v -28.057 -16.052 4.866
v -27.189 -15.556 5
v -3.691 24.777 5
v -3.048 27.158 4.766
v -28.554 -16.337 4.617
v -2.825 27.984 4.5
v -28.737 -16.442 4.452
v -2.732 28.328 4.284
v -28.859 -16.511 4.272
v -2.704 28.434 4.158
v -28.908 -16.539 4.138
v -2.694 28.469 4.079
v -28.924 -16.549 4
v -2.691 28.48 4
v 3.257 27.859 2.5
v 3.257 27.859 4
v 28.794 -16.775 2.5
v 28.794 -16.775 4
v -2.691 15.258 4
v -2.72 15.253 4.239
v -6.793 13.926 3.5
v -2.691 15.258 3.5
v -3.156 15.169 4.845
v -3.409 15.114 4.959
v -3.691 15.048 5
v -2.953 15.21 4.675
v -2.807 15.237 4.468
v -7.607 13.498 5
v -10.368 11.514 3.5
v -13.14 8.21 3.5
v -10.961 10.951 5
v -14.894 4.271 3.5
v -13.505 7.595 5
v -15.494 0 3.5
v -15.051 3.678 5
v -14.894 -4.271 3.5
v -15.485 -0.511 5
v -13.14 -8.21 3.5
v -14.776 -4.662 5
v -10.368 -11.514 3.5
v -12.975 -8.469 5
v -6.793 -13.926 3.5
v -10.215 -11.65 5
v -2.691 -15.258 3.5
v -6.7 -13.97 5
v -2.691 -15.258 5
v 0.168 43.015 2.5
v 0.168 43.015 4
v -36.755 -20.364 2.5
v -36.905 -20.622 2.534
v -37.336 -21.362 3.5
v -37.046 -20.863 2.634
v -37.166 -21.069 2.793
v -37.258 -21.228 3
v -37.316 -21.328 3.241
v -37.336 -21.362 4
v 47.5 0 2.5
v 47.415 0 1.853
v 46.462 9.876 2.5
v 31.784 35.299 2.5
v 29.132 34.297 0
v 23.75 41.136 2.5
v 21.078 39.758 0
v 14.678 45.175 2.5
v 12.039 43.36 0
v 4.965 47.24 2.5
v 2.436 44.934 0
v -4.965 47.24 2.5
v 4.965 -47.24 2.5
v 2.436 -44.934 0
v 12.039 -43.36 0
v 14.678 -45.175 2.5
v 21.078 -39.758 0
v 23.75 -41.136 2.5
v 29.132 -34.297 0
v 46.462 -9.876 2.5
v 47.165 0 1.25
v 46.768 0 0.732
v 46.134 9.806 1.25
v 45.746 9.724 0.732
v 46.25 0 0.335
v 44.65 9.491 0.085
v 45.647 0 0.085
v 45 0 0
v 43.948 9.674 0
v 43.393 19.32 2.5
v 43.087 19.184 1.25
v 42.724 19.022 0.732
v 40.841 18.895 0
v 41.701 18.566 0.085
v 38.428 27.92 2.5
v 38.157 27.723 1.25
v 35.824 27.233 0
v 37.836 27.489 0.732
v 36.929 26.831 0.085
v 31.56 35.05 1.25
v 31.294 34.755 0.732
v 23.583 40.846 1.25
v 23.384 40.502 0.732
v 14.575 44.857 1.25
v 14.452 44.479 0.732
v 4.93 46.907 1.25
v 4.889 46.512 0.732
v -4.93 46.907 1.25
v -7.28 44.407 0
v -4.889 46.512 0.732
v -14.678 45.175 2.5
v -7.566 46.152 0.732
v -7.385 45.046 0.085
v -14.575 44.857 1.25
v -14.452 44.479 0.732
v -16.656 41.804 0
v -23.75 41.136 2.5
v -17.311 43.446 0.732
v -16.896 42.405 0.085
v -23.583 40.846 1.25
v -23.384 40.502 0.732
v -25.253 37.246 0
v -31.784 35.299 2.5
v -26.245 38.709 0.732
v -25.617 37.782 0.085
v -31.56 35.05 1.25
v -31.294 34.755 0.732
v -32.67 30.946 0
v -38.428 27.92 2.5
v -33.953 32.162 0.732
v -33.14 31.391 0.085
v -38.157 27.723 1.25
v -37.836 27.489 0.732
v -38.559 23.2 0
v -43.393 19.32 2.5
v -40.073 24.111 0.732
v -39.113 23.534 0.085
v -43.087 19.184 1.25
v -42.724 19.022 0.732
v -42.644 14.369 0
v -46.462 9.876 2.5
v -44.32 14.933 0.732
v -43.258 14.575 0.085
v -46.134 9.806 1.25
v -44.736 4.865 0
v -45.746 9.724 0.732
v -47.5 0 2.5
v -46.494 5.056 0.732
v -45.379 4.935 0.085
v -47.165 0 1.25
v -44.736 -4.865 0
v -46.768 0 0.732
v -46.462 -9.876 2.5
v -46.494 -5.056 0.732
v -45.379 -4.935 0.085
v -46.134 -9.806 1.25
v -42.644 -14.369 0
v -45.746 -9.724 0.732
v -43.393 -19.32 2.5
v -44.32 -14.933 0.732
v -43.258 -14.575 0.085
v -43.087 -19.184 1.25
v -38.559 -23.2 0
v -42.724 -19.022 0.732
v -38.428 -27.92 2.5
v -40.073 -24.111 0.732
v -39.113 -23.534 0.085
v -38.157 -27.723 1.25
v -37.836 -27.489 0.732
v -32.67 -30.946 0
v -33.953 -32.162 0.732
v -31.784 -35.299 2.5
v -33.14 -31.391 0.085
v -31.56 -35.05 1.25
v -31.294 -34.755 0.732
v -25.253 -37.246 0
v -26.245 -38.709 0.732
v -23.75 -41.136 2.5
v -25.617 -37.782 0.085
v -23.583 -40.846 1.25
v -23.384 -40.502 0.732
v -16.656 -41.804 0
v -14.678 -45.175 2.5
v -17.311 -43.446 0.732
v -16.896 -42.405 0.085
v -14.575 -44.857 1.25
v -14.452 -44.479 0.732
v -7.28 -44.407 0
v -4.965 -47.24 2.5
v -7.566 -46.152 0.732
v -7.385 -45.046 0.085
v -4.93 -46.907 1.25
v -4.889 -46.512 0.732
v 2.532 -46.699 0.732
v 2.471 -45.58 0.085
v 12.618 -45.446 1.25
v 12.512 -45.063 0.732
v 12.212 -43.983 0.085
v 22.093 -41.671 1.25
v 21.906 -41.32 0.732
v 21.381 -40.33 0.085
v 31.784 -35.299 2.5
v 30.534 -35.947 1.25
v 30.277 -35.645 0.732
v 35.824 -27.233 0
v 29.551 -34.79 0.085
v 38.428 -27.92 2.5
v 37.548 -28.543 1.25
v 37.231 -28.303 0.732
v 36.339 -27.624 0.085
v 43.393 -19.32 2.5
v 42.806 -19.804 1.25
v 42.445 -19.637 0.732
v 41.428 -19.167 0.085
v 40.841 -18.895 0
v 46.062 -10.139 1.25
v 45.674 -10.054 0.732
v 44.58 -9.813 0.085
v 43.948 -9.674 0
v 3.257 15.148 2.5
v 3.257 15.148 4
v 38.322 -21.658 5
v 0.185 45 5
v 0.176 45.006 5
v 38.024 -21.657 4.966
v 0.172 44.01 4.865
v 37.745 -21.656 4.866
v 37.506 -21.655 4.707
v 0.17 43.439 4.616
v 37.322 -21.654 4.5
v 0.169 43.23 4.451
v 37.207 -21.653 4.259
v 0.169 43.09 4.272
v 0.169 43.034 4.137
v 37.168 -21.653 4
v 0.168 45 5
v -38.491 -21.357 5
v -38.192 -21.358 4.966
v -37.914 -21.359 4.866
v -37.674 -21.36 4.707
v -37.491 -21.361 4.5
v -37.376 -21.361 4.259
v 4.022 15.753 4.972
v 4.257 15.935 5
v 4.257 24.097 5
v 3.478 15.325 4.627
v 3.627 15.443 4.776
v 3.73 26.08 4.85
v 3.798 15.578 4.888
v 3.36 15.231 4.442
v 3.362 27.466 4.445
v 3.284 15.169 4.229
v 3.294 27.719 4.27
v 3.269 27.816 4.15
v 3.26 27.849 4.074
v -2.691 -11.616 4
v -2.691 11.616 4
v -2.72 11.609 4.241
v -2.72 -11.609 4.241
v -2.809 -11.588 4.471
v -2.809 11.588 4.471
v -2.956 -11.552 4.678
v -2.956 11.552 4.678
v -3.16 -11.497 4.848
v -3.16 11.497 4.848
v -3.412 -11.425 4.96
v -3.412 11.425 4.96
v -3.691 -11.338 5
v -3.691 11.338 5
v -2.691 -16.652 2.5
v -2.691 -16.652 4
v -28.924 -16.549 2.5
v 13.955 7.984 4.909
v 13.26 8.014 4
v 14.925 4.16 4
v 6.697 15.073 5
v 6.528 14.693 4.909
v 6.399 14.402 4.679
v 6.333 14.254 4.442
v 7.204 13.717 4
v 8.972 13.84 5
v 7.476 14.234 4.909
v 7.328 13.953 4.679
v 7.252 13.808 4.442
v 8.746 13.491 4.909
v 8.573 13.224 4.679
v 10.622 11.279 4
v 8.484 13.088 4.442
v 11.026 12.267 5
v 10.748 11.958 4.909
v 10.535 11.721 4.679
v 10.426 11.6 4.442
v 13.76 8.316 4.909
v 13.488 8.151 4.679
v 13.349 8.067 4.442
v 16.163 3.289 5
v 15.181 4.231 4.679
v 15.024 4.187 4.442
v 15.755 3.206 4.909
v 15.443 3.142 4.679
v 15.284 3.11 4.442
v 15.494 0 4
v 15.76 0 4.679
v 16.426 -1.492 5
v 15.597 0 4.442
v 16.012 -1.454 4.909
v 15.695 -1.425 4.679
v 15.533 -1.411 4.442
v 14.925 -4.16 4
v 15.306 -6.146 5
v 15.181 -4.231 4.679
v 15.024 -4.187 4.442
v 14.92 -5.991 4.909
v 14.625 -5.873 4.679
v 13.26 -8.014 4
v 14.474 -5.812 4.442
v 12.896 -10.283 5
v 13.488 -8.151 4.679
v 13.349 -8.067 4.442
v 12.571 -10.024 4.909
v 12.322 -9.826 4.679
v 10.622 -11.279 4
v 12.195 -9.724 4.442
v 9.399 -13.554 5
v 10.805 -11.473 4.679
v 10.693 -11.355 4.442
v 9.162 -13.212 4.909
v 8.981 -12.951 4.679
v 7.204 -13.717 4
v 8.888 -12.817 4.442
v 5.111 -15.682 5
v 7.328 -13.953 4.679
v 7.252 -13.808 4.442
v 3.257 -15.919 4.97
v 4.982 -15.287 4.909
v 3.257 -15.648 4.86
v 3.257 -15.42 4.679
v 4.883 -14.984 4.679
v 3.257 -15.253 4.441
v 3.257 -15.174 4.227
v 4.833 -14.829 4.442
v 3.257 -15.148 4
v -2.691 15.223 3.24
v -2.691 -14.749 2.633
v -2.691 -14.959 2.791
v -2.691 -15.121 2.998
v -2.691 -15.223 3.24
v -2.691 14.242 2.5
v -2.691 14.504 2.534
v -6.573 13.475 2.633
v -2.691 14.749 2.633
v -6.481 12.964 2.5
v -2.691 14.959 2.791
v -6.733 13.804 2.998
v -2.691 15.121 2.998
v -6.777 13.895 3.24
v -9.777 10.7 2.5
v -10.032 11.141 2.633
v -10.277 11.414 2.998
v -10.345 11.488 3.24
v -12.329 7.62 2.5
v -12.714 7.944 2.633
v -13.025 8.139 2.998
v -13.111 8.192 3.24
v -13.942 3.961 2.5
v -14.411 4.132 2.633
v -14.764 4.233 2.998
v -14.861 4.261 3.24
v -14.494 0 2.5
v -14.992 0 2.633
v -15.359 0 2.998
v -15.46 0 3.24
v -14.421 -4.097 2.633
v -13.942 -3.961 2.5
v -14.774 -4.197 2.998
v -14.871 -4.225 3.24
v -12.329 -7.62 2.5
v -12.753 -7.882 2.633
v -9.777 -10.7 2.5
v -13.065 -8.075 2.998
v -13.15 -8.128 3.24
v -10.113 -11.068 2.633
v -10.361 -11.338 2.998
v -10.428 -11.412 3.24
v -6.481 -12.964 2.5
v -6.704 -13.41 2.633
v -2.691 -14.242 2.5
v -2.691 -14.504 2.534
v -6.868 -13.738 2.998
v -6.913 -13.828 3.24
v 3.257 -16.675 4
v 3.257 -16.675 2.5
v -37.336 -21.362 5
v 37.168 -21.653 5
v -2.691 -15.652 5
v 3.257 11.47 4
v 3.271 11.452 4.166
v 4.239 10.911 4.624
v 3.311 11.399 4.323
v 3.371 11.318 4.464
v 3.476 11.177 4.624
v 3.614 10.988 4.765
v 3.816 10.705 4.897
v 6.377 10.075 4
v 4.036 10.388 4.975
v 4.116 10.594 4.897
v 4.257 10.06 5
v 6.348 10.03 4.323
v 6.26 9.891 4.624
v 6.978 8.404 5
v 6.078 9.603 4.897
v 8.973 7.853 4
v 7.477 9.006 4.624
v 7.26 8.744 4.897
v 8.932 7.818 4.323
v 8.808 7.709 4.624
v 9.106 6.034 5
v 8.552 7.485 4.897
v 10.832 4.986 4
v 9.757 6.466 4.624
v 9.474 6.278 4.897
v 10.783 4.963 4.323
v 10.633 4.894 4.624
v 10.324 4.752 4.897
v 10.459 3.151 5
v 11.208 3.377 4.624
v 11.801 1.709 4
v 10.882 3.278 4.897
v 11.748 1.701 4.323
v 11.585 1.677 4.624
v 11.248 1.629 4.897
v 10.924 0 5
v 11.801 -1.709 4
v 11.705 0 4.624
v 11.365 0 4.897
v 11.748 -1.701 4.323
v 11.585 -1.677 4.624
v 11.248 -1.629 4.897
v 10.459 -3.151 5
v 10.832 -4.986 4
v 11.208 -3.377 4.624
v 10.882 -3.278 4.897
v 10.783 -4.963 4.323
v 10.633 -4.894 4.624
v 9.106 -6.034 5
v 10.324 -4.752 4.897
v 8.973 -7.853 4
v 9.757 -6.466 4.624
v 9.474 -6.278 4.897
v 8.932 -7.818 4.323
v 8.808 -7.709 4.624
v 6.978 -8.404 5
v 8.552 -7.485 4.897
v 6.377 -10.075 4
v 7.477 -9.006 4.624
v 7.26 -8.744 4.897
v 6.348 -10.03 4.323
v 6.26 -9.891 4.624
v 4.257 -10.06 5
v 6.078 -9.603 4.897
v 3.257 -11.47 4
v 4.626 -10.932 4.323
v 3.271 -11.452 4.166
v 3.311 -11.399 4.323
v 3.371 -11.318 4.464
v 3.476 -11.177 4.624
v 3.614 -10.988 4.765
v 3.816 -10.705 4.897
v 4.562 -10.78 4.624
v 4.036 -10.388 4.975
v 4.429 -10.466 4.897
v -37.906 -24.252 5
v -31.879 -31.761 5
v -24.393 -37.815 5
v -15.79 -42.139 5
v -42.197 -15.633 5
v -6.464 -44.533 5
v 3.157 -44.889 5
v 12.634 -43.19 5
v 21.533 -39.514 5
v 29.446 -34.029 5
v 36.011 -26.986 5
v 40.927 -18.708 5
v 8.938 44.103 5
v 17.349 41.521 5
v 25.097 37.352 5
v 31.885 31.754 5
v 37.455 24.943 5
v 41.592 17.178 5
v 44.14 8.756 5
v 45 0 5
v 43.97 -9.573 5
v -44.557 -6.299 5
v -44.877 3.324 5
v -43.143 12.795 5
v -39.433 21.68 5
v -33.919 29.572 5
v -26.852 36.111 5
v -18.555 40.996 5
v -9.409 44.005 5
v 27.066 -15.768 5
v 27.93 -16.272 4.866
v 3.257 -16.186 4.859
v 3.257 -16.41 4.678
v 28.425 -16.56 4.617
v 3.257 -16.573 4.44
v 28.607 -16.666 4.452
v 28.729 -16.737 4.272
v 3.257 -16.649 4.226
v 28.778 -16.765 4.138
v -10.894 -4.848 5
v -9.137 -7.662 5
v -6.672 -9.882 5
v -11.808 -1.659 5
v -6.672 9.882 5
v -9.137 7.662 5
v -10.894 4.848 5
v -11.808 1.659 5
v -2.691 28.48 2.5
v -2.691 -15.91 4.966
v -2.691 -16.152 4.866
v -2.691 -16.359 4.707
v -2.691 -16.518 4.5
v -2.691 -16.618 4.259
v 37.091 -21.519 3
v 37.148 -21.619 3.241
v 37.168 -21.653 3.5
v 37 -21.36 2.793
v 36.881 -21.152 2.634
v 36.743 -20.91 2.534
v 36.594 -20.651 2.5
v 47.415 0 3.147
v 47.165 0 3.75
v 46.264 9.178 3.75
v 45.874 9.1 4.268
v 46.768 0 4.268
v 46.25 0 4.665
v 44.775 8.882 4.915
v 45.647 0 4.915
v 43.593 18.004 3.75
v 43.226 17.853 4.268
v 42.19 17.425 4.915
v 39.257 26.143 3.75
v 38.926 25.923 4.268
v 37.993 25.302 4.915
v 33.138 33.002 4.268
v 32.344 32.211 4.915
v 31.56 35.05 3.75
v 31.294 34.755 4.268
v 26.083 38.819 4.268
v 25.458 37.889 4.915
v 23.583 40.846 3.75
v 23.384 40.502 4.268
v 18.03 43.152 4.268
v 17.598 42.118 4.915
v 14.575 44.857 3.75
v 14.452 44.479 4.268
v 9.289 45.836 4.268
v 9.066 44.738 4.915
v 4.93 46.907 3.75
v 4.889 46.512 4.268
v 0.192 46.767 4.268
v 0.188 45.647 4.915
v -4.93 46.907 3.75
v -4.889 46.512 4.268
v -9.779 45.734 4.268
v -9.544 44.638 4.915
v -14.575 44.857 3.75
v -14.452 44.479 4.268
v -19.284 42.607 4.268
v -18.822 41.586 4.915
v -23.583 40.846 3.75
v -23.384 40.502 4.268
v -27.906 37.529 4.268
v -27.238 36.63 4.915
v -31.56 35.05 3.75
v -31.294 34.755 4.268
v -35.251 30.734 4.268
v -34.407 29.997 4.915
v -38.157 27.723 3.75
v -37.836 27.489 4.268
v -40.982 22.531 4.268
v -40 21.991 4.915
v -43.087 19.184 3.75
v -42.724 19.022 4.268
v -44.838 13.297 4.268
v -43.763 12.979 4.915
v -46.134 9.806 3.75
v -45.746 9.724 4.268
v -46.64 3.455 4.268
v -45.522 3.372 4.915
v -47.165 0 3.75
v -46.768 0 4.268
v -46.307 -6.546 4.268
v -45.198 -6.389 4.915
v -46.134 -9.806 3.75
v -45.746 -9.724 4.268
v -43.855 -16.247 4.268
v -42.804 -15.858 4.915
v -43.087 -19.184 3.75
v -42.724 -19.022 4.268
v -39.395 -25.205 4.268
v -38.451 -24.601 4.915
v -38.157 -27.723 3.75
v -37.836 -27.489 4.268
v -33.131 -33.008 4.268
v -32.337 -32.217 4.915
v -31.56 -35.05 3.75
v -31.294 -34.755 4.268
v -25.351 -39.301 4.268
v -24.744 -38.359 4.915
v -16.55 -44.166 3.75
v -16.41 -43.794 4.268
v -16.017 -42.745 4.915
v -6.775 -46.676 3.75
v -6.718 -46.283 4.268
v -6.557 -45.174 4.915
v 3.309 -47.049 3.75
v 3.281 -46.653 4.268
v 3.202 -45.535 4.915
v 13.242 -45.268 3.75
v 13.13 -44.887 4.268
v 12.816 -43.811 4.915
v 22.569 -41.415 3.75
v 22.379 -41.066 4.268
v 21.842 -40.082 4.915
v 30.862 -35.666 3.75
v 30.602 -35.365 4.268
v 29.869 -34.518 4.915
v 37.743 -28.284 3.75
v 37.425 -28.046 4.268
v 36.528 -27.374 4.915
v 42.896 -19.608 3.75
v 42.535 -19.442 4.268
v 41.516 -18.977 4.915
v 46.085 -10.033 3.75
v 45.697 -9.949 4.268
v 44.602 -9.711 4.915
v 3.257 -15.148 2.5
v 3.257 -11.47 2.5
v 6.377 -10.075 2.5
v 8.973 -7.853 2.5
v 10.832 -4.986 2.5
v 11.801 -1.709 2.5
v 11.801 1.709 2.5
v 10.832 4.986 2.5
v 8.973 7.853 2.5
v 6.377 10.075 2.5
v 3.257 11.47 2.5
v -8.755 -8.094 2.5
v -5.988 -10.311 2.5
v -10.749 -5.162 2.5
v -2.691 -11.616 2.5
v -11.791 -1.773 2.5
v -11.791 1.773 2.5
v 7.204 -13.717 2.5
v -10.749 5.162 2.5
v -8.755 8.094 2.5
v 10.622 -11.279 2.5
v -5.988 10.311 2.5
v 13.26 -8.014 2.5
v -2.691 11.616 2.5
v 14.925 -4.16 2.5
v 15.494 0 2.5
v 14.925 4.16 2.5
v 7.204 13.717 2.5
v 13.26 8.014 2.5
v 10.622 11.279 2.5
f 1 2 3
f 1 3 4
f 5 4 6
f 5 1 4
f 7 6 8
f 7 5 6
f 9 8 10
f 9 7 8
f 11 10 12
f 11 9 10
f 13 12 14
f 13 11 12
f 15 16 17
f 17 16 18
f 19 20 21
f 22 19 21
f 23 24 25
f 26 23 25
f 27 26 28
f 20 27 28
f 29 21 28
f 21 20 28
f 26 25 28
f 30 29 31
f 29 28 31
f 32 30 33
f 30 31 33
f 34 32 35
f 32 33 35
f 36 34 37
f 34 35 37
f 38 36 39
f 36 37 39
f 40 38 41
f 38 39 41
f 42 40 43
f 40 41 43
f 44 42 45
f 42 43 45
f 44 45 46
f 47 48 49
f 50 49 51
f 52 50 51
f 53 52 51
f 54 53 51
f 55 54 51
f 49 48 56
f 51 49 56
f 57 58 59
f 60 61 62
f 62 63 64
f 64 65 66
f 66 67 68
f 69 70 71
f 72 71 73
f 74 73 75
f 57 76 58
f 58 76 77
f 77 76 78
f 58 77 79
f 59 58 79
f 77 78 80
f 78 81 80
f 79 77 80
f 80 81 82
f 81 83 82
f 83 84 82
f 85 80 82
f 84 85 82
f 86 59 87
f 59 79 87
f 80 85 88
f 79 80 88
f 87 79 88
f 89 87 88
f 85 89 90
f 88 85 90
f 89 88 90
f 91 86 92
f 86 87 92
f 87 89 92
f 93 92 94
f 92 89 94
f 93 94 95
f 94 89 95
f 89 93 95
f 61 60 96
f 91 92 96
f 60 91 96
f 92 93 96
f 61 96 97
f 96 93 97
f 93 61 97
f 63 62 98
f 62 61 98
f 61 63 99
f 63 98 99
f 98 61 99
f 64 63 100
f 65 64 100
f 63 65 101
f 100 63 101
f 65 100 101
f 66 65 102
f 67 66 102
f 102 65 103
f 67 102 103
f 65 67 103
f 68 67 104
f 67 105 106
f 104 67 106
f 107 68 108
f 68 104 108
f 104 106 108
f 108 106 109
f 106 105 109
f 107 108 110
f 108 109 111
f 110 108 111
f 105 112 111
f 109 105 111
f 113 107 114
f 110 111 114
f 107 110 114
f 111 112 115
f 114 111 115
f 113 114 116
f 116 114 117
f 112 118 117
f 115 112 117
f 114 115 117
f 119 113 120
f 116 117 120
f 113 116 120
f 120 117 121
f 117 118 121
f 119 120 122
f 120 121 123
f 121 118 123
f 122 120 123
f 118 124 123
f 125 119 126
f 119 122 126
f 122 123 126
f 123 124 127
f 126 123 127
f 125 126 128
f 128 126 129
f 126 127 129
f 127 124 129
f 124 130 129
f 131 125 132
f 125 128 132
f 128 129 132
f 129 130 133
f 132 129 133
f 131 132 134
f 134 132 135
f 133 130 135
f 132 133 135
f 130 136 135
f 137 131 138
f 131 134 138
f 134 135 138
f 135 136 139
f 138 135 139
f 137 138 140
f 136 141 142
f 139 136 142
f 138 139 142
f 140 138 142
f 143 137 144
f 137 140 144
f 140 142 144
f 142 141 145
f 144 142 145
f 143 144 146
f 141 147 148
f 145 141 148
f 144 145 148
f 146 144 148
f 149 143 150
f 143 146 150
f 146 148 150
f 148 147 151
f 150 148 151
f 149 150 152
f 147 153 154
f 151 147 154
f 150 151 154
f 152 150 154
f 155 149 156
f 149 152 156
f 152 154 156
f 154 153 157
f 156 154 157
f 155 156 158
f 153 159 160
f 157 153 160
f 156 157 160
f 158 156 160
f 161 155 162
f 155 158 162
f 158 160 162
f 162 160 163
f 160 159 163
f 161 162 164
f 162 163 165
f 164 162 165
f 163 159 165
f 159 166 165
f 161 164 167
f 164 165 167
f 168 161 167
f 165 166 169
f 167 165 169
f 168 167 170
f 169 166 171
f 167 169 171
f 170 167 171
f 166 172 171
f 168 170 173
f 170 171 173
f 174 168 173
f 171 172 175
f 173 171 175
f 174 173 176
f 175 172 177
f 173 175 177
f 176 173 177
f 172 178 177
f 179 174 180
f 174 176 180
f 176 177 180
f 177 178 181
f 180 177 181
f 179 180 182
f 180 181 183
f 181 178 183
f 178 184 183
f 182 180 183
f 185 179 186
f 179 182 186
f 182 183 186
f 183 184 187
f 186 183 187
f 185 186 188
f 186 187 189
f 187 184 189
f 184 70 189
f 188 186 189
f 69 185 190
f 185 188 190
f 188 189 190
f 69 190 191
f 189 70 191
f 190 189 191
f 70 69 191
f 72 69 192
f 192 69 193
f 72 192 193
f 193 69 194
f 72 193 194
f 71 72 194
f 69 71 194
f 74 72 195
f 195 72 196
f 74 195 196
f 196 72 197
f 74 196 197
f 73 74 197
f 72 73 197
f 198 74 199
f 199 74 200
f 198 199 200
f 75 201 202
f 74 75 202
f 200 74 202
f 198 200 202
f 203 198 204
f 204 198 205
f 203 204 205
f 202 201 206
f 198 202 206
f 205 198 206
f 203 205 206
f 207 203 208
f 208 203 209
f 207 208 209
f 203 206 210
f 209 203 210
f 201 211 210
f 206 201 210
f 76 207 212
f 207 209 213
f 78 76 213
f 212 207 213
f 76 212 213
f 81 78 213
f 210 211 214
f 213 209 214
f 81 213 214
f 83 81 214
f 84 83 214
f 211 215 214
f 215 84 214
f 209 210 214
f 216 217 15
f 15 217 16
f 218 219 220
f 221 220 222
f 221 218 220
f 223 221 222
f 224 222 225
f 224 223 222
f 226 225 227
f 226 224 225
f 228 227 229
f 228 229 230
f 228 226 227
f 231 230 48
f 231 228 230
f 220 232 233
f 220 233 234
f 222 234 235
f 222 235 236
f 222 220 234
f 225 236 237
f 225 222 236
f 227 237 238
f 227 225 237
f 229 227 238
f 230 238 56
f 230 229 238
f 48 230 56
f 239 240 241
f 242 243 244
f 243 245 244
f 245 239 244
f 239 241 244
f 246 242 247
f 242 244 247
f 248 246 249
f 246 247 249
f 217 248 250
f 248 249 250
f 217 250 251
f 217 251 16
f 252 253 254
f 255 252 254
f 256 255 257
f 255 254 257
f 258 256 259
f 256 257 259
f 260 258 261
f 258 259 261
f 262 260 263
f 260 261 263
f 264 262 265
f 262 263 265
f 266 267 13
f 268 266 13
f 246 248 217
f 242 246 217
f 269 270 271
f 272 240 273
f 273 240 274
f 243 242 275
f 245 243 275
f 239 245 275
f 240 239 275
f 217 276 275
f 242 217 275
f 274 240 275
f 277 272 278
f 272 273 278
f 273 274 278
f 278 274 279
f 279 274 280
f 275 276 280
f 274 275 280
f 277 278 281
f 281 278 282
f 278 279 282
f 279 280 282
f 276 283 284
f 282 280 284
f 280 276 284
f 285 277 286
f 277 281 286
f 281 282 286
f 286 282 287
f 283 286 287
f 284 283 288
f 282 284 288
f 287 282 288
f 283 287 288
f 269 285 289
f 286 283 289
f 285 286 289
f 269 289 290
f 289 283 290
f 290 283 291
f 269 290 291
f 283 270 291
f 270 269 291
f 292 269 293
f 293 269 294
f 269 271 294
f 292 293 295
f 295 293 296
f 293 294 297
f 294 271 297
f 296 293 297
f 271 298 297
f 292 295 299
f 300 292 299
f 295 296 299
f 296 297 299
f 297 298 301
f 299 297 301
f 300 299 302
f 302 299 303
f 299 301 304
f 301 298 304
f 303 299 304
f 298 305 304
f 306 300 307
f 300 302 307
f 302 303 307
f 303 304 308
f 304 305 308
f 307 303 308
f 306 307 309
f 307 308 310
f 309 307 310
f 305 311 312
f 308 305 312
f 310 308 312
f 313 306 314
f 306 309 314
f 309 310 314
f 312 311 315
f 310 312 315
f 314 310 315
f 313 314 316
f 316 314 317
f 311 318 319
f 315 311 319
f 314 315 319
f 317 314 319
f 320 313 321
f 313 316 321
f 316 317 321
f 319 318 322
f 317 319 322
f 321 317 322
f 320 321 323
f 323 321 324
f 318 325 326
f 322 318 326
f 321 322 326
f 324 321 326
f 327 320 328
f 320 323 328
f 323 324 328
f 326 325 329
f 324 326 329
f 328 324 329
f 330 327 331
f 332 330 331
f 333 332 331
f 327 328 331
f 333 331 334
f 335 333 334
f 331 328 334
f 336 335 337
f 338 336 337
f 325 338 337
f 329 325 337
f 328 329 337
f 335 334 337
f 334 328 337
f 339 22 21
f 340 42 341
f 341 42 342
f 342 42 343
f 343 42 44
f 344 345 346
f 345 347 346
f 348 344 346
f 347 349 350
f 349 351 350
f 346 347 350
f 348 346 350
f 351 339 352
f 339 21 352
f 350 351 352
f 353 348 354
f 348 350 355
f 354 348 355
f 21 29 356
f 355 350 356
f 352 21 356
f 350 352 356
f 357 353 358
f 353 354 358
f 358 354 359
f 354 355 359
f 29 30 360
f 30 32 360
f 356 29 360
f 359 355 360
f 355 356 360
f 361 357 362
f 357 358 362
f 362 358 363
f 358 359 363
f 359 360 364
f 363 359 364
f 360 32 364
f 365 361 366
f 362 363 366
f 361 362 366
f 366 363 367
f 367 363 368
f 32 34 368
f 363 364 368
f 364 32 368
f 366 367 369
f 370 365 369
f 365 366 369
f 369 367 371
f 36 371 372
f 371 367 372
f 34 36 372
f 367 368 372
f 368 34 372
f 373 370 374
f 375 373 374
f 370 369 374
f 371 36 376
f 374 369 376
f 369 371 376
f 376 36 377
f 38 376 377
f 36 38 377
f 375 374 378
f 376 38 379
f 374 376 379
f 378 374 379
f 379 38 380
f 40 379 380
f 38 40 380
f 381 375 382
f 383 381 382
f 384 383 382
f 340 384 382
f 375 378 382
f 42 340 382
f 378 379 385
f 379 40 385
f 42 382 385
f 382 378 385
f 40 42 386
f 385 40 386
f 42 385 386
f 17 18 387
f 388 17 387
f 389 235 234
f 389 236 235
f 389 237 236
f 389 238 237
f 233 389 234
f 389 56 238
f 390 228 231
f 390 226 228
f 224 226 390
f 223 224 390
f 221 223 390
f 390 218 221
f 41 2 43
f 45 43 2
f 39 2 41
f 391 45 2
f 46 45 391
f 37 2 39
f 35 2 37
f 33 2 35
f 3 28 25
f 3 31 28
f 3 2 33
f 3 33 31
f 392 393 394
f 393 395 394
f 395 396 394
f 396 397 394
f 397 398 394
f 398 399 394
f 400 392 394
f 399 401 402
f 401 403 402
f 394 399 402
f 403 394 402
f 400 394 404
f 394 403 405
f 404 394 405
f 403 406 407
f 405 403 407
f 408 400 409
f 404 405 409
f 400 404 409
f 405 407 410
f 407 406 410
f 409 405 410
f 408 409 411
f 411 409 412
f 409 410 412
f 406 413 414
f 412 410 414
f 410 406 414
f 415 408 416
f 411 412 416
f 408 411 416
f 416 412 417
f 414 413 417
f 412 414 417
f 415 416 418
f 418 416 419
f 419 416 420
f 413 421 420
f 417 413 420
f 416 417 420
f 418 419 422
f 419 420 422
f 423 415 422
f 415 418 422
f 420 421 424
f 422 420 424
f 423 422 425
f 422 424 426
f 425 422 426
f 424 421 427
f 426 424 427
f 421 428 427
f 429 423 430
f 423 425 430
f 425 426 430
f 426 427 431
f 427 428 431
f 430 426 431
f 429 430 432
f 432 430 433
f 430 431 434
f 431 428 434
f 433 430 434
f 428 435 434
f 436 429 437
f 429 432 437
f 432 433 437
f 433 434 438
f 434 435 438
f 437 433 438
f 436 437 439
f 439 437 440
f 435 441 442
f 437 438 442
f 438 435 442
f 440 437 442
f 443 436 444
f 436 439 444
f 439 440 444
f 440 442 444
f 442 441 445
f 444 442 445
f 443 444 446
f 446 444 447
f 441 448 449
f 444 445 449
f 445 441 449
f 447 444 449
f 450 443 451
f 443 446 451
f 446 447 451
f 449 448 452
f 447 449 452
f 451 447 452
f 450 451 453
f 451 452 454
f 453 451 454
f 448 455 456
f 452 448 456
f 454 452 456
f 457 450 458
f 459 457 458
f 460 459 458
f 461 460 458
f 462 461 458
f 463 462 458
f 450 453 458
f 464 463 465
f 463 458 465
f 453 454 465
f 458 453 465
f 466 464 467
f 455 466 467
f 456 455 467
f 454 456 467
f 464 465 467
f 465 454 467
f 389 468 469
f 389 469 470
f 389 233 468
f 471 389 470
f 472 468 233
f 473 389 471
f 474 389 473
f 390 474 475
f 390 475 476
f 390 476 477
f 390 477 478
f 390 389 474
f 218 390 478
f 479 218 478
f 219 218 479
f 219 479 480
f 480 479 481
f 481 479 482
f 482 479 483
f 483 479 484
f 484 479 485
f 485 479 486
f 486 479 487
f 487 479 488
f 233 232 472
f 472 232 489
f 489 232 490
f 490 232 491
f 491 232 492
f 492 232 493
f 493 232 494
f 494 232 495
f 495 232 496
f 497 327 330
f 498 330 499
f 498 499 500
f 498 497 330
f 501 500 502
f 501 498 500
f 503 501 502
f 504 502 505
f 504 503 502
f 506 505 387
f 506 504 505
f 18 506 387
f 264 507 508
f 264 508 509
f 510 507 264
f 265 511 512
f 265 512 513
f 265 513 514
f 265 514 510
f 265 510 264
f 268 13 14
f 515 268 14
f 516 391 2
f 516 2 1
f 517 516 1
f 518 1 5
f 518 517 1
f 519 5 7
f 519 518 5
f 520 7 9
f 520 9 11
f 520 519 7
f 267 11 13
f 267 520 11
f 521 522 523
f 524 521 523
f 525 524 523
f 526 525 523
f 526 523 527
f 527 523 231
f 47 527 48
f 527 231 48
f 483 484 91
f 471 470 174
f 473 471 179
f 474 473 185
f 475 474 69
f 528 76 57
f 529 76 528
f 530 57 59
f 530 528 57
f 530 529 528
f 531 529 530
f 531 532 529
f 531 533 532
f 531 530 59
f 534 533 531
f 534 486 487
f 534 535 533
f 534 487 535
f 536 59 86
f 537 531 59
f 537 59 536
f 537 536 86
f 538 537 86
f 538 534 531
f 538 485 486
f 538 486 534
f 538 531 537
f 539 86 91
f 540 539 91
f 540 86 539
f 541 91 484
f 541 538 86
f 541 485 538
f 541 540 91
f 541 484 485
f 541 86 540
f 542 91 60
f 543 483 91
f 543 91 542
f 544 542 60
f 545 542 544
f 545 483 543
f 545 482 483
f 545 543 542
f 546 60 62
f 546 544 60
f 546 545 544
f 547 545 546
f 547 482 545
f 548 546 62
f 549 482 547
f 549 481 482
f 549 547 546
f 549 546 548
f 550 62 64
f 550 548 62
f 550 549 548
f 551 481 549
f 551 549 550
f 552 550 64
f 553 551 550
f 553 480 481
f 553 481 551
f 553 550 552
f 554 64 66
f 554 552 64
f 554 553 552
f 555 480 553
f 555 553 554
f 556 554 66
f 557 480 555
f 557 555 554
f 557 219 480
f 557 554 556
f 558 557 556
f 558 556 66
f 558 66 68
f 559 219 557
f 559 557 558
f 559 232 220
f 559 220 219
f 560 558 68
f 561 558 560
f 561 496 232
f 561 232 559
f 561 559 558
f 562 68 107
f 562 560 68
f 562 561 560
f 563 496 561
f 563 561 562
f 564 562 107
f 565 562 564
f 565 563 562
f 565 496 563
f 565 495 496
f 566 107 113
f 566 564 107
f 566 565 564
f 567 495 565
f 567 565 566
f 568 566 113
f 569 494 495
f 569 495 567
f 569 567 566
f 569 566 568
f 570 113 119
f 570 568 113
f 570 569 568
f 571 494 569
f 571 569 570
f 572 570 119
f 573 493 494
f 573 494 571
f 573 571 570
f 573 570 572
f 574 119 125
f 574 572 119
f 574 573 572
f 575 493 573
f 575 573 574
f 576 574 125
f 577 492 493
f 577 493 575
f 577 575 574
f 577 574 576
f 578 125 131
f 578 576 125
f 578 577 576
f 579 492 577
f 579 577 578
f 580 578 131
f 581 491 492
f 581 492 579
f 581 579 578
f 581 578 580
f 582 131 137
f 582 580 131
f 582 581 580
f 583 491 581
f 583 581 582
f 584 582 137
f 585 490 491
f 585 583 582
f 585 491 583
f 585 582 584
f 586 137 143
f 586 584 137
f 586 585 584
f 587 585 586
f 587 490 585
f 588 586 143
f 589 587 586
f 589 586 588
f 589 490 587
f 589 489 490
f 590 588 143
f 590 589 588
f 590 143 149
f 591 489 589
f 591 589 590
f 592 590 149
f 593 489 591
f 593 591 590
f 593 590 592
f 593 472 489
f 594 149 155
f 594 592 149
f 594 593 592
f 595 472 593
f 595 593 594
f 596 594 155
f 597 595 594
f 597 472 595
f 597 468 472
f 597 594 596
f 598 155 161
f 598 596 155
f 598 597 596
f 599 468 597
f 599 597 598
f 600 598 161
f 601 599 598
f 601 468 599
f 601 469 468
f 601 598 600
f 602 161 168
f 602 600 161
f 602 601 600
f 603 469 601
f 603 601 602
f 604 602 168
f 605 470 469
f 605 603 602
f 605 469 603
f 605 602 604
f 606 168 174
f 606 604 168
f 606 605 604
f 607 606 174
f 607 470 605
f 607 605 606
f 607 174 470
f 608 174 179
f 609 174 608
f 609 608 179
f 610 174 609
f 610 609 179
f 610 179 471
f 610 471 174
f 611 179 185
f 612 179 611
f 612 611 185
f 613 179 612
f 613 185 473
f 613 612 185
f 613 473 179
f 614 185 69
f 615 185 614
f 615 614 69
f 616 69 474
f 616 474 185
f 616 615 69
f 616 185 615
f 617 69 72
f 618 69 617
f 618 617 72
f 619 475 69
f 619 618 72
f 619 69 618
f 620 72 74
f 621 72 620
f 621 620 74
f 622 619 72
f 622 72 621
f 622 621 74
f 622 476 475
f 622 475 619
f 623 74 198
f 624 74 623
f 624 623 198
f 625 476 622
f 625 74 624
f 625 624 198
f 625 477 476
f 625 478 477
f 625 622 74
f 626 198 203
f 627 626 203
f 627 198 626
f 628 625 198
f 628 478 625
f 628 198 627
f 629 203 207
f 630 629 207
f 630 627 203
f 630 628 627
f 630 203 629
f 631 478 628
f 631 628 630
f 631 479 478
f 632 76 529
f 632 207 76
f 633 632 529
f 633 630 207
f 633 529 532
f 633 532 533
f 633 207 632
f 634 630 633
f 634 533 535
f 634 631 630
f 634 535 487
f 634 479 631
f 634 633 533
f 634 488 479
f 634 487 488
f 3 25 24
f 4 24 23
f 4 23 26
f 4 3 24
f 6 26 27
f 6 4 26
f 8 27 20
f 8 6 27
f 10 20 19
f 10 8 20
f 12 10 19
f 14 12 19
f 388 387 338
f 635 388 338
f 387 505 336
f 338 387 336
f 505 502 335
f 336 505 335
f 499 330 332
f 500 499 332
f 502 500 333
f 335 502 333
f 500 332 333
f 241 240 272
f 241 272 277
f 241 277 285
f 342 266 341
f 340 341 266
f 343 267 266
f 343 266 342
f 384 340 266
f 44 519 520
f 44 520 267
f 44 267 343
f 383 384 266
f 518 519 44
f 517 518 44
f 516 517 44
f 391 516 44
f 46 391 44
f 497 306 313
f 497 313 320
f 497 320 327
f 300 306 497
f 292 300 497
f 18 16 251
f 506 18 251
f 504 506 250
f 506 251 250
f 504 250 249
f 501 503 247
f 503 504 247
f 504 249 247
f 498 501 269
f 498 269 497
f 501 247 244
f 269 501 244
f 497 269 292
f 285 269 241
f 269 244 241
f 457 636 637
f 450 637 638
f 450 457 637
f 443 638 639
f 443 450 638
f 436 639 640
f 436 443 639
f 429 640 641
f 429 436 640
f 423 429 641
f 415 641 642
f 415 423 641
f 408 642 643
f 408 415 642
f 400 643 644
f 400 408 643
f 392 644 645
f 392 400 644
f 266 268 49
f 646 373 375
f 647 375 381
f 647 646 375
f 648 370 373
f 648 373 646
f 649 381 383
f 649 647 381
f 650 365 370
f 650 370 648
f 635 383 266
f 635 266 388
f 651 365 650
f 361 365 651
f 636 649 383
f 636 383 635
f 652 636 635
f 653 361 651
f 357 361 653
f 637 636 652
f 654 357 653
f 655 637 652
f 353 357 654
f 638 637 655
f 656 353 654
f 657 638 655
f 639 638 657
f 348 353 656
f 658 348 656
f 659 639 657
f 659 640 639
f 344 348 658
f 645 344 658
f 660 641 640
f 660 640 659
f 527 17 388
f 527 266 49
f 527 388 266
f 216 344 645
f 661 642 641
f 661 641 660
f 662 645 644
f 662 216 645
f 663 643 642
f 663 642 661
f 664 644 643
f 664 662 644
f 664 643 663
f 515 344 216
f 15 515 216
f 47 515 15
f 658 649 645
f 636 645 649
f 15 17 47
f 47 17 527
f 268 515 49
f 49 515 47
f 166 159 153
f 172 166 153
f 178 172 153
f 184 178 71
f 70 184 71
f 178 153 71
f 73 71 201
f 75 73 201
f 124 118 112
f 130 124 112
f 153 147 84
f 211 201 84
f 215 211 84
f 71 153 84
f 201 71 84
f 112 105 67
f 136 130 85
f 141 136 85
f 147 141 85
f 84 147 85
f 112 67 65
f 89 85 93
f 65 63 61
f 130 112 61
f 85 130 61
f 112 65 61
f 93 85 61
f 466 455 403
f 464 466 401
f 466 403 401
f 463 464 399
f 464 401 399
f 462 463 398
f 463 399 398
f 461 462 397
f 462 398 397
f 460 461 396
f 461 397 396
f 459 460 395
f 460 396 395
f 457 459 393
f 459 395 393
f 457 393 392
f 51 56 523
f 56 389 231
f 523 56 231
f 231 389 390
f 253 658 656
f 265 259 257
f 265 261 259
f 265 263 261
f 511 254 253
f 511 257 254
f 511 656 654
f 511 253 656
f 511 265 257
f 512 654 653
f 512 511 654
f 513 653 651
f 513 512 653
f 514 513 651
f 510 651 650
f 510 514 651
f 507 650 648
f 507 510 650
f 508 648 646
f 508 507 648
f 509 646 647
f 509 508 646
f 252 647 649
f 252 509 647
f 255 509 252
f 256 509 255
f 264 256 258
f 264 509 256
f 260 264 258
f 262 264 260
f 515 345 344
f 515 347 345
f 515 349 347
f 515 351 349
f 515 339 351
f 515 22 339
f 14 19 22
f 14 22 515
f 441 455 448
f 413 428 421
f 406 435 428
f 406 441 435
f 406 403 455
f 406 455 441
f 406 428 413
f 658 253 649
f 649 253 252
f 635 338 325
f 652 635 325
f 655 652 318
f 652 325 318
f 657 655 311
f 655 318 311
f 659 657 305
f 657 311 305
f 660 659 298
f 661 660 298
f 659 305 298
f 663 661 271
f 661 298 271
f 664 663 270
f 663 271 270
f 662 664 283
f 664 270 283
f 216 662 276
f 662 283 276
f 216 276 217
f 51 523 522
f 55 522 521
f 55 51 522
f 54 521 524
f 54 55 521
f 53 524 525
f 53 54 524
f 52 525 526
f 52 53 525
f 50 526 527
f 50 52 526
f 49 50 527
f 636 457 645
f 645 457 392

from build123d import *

# Parameters (mm, degrees)
F0_R         = 47.5
F1_DEPTH     = 5
F3_DEPTH     = 2.5
F4_R         = 15.4938561144
F4_R_2       = 11.9238234347
F5_DEPTH     = 2.5
F7_DEPTH     = 2.5
F8_R         = 2.49999
F9_T1_DEPTH  = 79.5044599257
F9_T6_ANGLE  = 178.5086872517
F9_T8_DEPTH  = 27.9406148573
F9_T10_DEPTH = 28.2323532374
F9_T12_DEPTH = 17.7111990238
F9_T14_DEPTH = 18.2220956401
F9_T16_DEPTH = 31.2335819135
F9_T18_DEPTH = 30.5369030224
F9_T20_DEPTH = 56.4226854656
F9_T22_DEPTH = 57.113596888
F9_T25_ANGLE = 172.3459061433
F9_T27_ANGLE = 174.2406786555
F9_T31_DEPTH = 79.5044599257
F9_T37_DEPTH = 79.5044599257
F9_T44_DEPTH = 79.5044599257
F9_T48_DEPTH = 79.5044599257


# Not quite as in the source:
# - a fillet or chamfer that OpenCascade refuses, or shapes differently, is made with other operations: its cross-section is extruded or revolved along the edge and cut away or added
# - a fillet or chamfer is up to 0.001 mm smaller than in the source, because OpenCascade refuses the exact size


with BuildPart() as f1:
    # F0 (on Top) → F1 (new body)
    with BuildSketch(Plane.XY):
        Circle(F0_R)
    extrude(amount=F1_DEPTH)

    # F2 (on face) → F3 (cut)
    with BuildSketch(Plane.XY.offset(5)):
        Polygon((-37.336189985, -21.3615019839), (37.1676983736, -21.6533380156), (0.1684916114, 43.0148399995), align=None)
        Polygon((-28.924478218, -16.5488310158), (0.1305310463, 33.3237484359), (28.7939471716, -16.77491742), align=None, mode=Mode.SUBTRACT)
    extrude(amount=-F3_DEPTH, mode=Mode.SUBTRACT)

    # F4 (on face) → F5 (cut)
    with BuildSketch(Plane.XY.offset(5)):
        Circle(F4_R)
        Circle(F4_R_2, mode=Mode.SUBTRACT)
    extrude(amount=-F5_DEPTH, mode=Mode.SUBTRACT)

    # F6 (on face) → F7 (cut)
    with BuildSketch(Plane.XY.offset(5)):
        with BuildLine():
            Line((3.2572400577, 27.8588049238), (0.1305310463, 33.3237484359))
            Line((0.1305310463, 33.3237484359), (-2.6910975575, 28.4804563395))
            Line((-2.6910975575, 28.4804563395), (-2.6910975575, 15.2583606993))
            ThreePointArc((-2.6910975575, 15.2583606993), (0.2884371491, 15.491171076), (3.2572400577, 15.1476059))
            Line((3.2572400577, 15.1476059), (3.2572400577, 27.8588049238))
        make_face()
        with BuildLine():
            ThreePointArc((3.2572400577, 15.1476059), (0.2884371491, 15.491171076), (-2.6910975575, 15.2583606993))
            Line((-2.6910975575, 15.2583606993), (-2.6910975575, -15.2583606993))
            ThreePointArc((-2.6910975575, -15.2583606993), (0.2884371491, -15.491171076), (3.2572400577, -15.1476059))
            Line((3.2572400577, -15.1476059), (3.2572400577, 15.1476059))
        make_face()
        with BuildLine():
            ThreePointArc((3.2572400577, -15.1476059), (0.2884371491, -15.491171076), (-2.6910975575, -15.2583606993))
            Line((-2.6910975575, -15.2583606993), (-2.6910975575, -16.6515886823))
            Line((-2.6910975575, -16.6515886823), (3.2572400577, -16.6748886641))
            Line((3.2572400577, -16.6748886641), (3.2572400577, -15.1476059))
        make_face()
    extrude(amount=-F7_DEPTH, mode=Mode.SUBTRACT)

    # F8 (radius 2.5 in the source; OpenCascade refuses exactly that, so slightly less here)
    f8_edges = [f1.edges().sort_by_distance(p)[0] for p in [
        (-47.5, 0, 5),
        (-47.5, 0, 0),
    ]]
    fillet(f8_edges, radius=F8_R)

    # F9: fillet of radius 1 on 14 edges, made by hand

    # F9_s2 → F9_t1 (join)
    with BuildSketch(Plane(origin=(-39.7519250003, 0.155710585, 0), x_dir=(0, 0, 1), z_dir=(0.9999923284, -0.0039170277, 0))):
        with BuildLine():
            ThreePointArc((3.5, 21.507584997), (2.7928932188, 21.2146917781), (2.5, 20.507584997))
            Line((2.5, 20.507584997), (2.5, 21.507584997))
            Line((2.5, 21.507584997), (3.5, 21.507584997))
        make_face()
    extrude(amount=F9_T1_DEPTH)


with BuildPart() as f9_tool4:
    # F9_s5 → F9_t6 (revolve)
    with BuildSketch(Plane(origin=(0, 0, 0), x_dir=(0, 0, 1), z_dir=(0.999915317, 0.0130137915, 0))):
        with BuildLine():
            ThreePointArc((2.5, -14.4938561144), (2.7928932188, -15.2009628956), (3.5, -15.4938561144))
            Line((3.5, -15.4938561144), (2.5, -15.4938561144))
            Line((2.5, -15.4938561144), (2.5, -14.4938561144))
        make_face()
    revolve(axis=Axis((0, 0, 2.5), (0, 0, 1)), revolution_arc=F9_T6_ANGLE)

    split(bisect_by=Plane.YZ.offset(-2.6910975575), keep=Keep.BOTTOM)


with BuildPart() as f1_1:
    add(f1.part)

    # F9_t3: union F9_tool4
    add(f9_tool4.part)

    # F9_s9 → F9_t8 (cut)
    with BuildSketch(Plane.XZ.offset(-13.9703074287)):
        with BuildLine():
            ThreePointArc((4.2572400577, 5), (3.5501332765, 4.7071067812), (3.2572400577, 4))
            Line((3.2572400577, 4), (3.2572400577, 5))
            Line((3.2572400577, 5), (4.2572400577, 5))
        make_face()
    extrude(amount=F9_T8_DEPTH, mode=Mode.SUBTRACT)

    # F9_s11 → F9_t10 (cut)
    with BuildSketch(Plane.XZ.offset(-14.1161766187)):
        with BuildLine():
            ThreePointArc((-2.6910975575, 4), (-2.9839907764, 4.7071067812), (-3.6910975575, 5))
            Line((-3.6910975575, 5), (-2.6910975575, 5))
            Line((-2.6910975575, 5), (-2.6910975575, 4))
        make_face()
    extrude(amount=F9_T10_DEPTH, mode=Mode.SUBTRACT)

    # F9_s13 → F9_t12 (cut)
    with BuildSketch(Plane.XZ.offset(-30.3588049238)):
        with BuildLine():
            ThreePointArc((4.2572400577, 5), (3.5501332765, 4.7071067812), (3.2572400577, 4))
            Line((3.2572400577, 4), (3.2572400577, 5))
            Line((3.2572400577, 5), (4.2572400577, 5))
        make_face()
    extrude(amount=F9_T12_DEPTH, mode=Mode.SUBTRACT)

    # F9_s15 → F9_t14 (cut)
    with BuildSketch(Plane.XZ.offset(-30.9804563395)):
        with BuildLine():
            ThreePointArc((-3.6910975575, 5), (-2.9839907764, 4.7071067812), (-2.6910975575, 4))
            Line((-2.6910975575, 4), (-2.6910975575, 5))
            Line((-2.6910975575, 5), (-3.6910975575, 5))
        make_face()
    extrude(amount=F9_T14_DEPTH, mode=Mode.SUBTRACT)

    # F9_s17 → F9_t16 (cut)
    with BuildSketch(Plane(origin=(-0.1258512133, 0.0004929665, 0), x_dir=(0, 0, 1), z_dir=(-0.9999923284, 0.0039170277, 0))):
        with BuildLine():
            ThreePointArc((5, -15.6620020419), (4.7071067812, -16.369108823), (4, -16.6620020419))
            Line((4, -16.6620020419), (5, -16.6620020419))
            Line((5, -16.6620020419), (5, -15.6620020419))
        make_face()
    extrude(amount=F9_T16_DEPTH, mode=Mode.SUBTRACT)

    # F9_s19 → F9_t18 (cut)
    with BuildSketch(Plane(origin=(31.3591935158, -0.1228357713, 0), x_dir=(0, 0, 1), z_dir=(-0.9999923284, 0.0039170277, 0))):
        with BuildLine():
            ThreePointArc((5, -15.6620020419), (4.7071067812, -16.369108823), (4, -16.6620020419))
            Line((4, -16.6620020419), (5, -16.6620020419))
            Line((5, -16.6620020419), (5, -15.6620020419))
        make_face()
    extrude(amount=F9_T18_DEPTH, mode=Mode.SUBTRACT)

    # F9_s21 → F9_t20 (cut)
    with BuildSketch(Plane(origin=(-12.4465088481, 21.7543326005, 0), x_dir=(0, 0, 1), z_dir=(0.4966039187, -0.8679772738, 0))):
        with BuildLine():
            ThreePointArc((4, -16.6620020419), (4.7071067812, -16.369108823), (5, -15.6620020419))
            Line((5, -15.6620020419), (5, -16.6620020419))
            Line((5, -16.6620020419), (4, -16.6620020419))
        make_face()
    extrude(amount=F9_T20_DEPTH, mode=Mode.SUBTRACT)

    # F9_s23 → F9_t22 (cut)
    with BuildSketch(Plane(origin=(-15.7859756564, -27.0964403413, 0), x_dir=(0, 0, 1), z_dir=(0.5033884097, 0.8640602462, 0))):
        with BuildLine():
            ThreePointArc((5, -15.6620020419), (4.7071067812, -16.369108823), (4, -16.6620020419))
            Line((4, -16.6620020419), (5, -16.6620020419))
            Line((5, -16.6620020419), (5, -15.6620020419))
        make_face()
    extrude(amount=F9_T22_DEPTH, mode=Mode.SUBTRACT)

    # F9_s24 → F9_t25 (revolve, cut)
    with BuildSketch(Plane(origin=(0, 0, 0), x_dir=(0, 0, 1), z_dir=(-0.997770072, 0.0667449131, 0))):
        with BuildLine():
            ThreePointArc((4, 11.9238234347), (4.7071067812, 11.6309302159), (5, 10.9238234347))
            Line((5, 10.9238234347), (5, 11.9238234347))
            Line((5, 11.9238234347), (4, 11.9238234347))
        make_face()
    revolve(axis=Axis((0, 0, 5), (0, 0, -1)), revolution_arc=F9_T25_ANGLE, mode=Mode.SUBTRACT)

    # F9_s26 → F9_t27 (revolve, cut)
    with BuildSketch(Plane(origin=(0, 0, 0), x_dir=(0, 0, 1), z_dir=(-0.9987372542, 0.0502384033, 0))):
        with BuildLine():
            ThreePointArc((5, 16.4938561144), (4.7071067812, 15.7867493333), (4, 15.4938561144))
            Line((4, 15.4938561144), (5, 15.4938561144))
            Line((5, 15.4938561144), (5, 16.4938561144))
        make_face()
    revolve(axis=Axis((0, 0, 5), (0, 0, -1)), revolution_arc=F9_T27_ANGLE, mode=Mode.SUBTRACT)


with BuildPart() as f9_tool29:
    # F9_s30 → F9_t31 (new body)
    with BuildSketch(Plane(origin=(20.0108118224, 34.3483216071, 0), x_dir=(0, 0, 1), z_dir=(-0.5033884097, -0.8640602462, 0))):
        with BuildLine():
            ThreePointArc((5, 22.507584997), (4.7071067812, 21.8004782158), (4, 21.507584997))
            Line((4, 21.507584997), (5, 21.507584997))
            Line((5, 21.507584997), (5, 22.507584997))
        make_face()
    extrude(amount=F9_T31_DEPTH)

    split(bisect_by=Plane(origin=(18.6680949925, 10.680750992, 0), x_dir=(0, 0, 1), z_dir=(-0.8679772738, -0.4966039187, 0)), keep=Keep.TOP)

    split(bisect_by=Plane(origin=(-0.0842458057, -21.5074199997, 0), x_dir=(0, 0, 1), z_dir=(0.0039170277, 0.9999923284, 0)), keep=Keep.TOP)


with BuildPart() as f1_2:
    add(f1_1.part)

    # F9_t28: cut F9_tool29
    add(f9_tool29.part, mode=Mode.SUBTRACT)


with BuildPart() as f9_tool35:
    # F9_s36 → F9_t37 (new body)
    with BuildSketch(Plane(origin=(19.7411131779, -34.5040321921, 0), x_dir=(0, 0, 1), z_dir=(-0.4966039187, 0.8679772738, 0))):
        with BuildLine():
            ThreePointArc((5, 22.507584997), (4.7071067812, 21.8004782158), (4, 21.507584997))
            Line((4, 21.507584997), (5, 21.507584997))
            Line((5, 21.507584997), (5, 22.507584997))
        make_face()
    extrude(amount=F9_T37_DEPTH)

    split(bisect_by=Plane(origin=(-18.5838491868, 10.8266690078, 0), x_dir=(0, 0, 1), z_dir=(0.8640602462, -0.5033884097, 0)), keep=Keep.TOP)

    split(bisect_by=Plane(origin=(-0.0842458057, -21.5074199997, 0), x_dir=(0, 0, 1), z_dir=(0.0039170277, 0.9999923284, 0)), keep=Keep.TOP)


with BuildPart() as f1_3:
    add(f1_2.part)

    # F9_t34: cut F9_tool35
    add(f9_tool35.part, mode=Mode.SUBTRACT)


with BuildPart() as f9_tool42:
    # F9_s43 → F9_t44 (new body)
    with BuildSketch(Plane(origin=(20.0108118224, 34.3483216071, 0), x_dir=(0, 0, 1), z_dir=(-0.5033884097, -0.8640602462, 0))):
        with BuildLine():
            ThreePointArc((5, 22.507584997), (4.7071067812, 21.8004782158), (4, 21.507584997))
            Line((4, 21.507584997), (5, 21.507584997))
            Line((5, 21.507584997), (5, 22.507584997))
        make_face()
    extrude(amount=F9_T44_DEPTH)

    split(bisect_by=Plane(origin=(18.6680949925, 10.680750992, 0), x_dir=(0, 0, 1), z_dir=(0.8679772738, 0.4966039187, 0)), keep=Keep.TOP)


with BuildPart() as f9_tool46:
    # F9_s47 → F9_t48 (new body)
    with BuildSketch(Plane(origin=(19.7411131779, -34.5040321921, 0), x_dir=(0, 0, 1), z_dir=(-0.4966039187, 0.8679772738, 0))):
        with BuildLine():
            ThreePointArc((5, 22.507584997), (4.7071067812, 21.8004782158), (4, 21.507584997))
            Line((4, 21.507584997), (5, 21.507584997))
            Line((5, 21.507584997), (5, 22.507584997))
        make_face()
    extrude(amount=F9_T48_DEPTH)

    split(bisect_by=Plane(origin=(-18.5838491868, 10.8266690078, 0), x_dir=(0, 0, 1), z_dir=(-0.8640602462, 0.5033884097, 0)), keep=Keep.TOP)


with BuildPart() as f9_tool42_1:
    add(f9_tool42.part)

    # F9_t50: intersect F9_tool46
    add(f9_tool46.part, mode=Mode.INTERSECT)


with BuildPart() as f1_4:
    add(f1_3.part)

    # F9_t40: cut F9_tool42
    add(f9_tool42_1.part, mode=Mode.SUBTRACT)


solid = f1_4.part
